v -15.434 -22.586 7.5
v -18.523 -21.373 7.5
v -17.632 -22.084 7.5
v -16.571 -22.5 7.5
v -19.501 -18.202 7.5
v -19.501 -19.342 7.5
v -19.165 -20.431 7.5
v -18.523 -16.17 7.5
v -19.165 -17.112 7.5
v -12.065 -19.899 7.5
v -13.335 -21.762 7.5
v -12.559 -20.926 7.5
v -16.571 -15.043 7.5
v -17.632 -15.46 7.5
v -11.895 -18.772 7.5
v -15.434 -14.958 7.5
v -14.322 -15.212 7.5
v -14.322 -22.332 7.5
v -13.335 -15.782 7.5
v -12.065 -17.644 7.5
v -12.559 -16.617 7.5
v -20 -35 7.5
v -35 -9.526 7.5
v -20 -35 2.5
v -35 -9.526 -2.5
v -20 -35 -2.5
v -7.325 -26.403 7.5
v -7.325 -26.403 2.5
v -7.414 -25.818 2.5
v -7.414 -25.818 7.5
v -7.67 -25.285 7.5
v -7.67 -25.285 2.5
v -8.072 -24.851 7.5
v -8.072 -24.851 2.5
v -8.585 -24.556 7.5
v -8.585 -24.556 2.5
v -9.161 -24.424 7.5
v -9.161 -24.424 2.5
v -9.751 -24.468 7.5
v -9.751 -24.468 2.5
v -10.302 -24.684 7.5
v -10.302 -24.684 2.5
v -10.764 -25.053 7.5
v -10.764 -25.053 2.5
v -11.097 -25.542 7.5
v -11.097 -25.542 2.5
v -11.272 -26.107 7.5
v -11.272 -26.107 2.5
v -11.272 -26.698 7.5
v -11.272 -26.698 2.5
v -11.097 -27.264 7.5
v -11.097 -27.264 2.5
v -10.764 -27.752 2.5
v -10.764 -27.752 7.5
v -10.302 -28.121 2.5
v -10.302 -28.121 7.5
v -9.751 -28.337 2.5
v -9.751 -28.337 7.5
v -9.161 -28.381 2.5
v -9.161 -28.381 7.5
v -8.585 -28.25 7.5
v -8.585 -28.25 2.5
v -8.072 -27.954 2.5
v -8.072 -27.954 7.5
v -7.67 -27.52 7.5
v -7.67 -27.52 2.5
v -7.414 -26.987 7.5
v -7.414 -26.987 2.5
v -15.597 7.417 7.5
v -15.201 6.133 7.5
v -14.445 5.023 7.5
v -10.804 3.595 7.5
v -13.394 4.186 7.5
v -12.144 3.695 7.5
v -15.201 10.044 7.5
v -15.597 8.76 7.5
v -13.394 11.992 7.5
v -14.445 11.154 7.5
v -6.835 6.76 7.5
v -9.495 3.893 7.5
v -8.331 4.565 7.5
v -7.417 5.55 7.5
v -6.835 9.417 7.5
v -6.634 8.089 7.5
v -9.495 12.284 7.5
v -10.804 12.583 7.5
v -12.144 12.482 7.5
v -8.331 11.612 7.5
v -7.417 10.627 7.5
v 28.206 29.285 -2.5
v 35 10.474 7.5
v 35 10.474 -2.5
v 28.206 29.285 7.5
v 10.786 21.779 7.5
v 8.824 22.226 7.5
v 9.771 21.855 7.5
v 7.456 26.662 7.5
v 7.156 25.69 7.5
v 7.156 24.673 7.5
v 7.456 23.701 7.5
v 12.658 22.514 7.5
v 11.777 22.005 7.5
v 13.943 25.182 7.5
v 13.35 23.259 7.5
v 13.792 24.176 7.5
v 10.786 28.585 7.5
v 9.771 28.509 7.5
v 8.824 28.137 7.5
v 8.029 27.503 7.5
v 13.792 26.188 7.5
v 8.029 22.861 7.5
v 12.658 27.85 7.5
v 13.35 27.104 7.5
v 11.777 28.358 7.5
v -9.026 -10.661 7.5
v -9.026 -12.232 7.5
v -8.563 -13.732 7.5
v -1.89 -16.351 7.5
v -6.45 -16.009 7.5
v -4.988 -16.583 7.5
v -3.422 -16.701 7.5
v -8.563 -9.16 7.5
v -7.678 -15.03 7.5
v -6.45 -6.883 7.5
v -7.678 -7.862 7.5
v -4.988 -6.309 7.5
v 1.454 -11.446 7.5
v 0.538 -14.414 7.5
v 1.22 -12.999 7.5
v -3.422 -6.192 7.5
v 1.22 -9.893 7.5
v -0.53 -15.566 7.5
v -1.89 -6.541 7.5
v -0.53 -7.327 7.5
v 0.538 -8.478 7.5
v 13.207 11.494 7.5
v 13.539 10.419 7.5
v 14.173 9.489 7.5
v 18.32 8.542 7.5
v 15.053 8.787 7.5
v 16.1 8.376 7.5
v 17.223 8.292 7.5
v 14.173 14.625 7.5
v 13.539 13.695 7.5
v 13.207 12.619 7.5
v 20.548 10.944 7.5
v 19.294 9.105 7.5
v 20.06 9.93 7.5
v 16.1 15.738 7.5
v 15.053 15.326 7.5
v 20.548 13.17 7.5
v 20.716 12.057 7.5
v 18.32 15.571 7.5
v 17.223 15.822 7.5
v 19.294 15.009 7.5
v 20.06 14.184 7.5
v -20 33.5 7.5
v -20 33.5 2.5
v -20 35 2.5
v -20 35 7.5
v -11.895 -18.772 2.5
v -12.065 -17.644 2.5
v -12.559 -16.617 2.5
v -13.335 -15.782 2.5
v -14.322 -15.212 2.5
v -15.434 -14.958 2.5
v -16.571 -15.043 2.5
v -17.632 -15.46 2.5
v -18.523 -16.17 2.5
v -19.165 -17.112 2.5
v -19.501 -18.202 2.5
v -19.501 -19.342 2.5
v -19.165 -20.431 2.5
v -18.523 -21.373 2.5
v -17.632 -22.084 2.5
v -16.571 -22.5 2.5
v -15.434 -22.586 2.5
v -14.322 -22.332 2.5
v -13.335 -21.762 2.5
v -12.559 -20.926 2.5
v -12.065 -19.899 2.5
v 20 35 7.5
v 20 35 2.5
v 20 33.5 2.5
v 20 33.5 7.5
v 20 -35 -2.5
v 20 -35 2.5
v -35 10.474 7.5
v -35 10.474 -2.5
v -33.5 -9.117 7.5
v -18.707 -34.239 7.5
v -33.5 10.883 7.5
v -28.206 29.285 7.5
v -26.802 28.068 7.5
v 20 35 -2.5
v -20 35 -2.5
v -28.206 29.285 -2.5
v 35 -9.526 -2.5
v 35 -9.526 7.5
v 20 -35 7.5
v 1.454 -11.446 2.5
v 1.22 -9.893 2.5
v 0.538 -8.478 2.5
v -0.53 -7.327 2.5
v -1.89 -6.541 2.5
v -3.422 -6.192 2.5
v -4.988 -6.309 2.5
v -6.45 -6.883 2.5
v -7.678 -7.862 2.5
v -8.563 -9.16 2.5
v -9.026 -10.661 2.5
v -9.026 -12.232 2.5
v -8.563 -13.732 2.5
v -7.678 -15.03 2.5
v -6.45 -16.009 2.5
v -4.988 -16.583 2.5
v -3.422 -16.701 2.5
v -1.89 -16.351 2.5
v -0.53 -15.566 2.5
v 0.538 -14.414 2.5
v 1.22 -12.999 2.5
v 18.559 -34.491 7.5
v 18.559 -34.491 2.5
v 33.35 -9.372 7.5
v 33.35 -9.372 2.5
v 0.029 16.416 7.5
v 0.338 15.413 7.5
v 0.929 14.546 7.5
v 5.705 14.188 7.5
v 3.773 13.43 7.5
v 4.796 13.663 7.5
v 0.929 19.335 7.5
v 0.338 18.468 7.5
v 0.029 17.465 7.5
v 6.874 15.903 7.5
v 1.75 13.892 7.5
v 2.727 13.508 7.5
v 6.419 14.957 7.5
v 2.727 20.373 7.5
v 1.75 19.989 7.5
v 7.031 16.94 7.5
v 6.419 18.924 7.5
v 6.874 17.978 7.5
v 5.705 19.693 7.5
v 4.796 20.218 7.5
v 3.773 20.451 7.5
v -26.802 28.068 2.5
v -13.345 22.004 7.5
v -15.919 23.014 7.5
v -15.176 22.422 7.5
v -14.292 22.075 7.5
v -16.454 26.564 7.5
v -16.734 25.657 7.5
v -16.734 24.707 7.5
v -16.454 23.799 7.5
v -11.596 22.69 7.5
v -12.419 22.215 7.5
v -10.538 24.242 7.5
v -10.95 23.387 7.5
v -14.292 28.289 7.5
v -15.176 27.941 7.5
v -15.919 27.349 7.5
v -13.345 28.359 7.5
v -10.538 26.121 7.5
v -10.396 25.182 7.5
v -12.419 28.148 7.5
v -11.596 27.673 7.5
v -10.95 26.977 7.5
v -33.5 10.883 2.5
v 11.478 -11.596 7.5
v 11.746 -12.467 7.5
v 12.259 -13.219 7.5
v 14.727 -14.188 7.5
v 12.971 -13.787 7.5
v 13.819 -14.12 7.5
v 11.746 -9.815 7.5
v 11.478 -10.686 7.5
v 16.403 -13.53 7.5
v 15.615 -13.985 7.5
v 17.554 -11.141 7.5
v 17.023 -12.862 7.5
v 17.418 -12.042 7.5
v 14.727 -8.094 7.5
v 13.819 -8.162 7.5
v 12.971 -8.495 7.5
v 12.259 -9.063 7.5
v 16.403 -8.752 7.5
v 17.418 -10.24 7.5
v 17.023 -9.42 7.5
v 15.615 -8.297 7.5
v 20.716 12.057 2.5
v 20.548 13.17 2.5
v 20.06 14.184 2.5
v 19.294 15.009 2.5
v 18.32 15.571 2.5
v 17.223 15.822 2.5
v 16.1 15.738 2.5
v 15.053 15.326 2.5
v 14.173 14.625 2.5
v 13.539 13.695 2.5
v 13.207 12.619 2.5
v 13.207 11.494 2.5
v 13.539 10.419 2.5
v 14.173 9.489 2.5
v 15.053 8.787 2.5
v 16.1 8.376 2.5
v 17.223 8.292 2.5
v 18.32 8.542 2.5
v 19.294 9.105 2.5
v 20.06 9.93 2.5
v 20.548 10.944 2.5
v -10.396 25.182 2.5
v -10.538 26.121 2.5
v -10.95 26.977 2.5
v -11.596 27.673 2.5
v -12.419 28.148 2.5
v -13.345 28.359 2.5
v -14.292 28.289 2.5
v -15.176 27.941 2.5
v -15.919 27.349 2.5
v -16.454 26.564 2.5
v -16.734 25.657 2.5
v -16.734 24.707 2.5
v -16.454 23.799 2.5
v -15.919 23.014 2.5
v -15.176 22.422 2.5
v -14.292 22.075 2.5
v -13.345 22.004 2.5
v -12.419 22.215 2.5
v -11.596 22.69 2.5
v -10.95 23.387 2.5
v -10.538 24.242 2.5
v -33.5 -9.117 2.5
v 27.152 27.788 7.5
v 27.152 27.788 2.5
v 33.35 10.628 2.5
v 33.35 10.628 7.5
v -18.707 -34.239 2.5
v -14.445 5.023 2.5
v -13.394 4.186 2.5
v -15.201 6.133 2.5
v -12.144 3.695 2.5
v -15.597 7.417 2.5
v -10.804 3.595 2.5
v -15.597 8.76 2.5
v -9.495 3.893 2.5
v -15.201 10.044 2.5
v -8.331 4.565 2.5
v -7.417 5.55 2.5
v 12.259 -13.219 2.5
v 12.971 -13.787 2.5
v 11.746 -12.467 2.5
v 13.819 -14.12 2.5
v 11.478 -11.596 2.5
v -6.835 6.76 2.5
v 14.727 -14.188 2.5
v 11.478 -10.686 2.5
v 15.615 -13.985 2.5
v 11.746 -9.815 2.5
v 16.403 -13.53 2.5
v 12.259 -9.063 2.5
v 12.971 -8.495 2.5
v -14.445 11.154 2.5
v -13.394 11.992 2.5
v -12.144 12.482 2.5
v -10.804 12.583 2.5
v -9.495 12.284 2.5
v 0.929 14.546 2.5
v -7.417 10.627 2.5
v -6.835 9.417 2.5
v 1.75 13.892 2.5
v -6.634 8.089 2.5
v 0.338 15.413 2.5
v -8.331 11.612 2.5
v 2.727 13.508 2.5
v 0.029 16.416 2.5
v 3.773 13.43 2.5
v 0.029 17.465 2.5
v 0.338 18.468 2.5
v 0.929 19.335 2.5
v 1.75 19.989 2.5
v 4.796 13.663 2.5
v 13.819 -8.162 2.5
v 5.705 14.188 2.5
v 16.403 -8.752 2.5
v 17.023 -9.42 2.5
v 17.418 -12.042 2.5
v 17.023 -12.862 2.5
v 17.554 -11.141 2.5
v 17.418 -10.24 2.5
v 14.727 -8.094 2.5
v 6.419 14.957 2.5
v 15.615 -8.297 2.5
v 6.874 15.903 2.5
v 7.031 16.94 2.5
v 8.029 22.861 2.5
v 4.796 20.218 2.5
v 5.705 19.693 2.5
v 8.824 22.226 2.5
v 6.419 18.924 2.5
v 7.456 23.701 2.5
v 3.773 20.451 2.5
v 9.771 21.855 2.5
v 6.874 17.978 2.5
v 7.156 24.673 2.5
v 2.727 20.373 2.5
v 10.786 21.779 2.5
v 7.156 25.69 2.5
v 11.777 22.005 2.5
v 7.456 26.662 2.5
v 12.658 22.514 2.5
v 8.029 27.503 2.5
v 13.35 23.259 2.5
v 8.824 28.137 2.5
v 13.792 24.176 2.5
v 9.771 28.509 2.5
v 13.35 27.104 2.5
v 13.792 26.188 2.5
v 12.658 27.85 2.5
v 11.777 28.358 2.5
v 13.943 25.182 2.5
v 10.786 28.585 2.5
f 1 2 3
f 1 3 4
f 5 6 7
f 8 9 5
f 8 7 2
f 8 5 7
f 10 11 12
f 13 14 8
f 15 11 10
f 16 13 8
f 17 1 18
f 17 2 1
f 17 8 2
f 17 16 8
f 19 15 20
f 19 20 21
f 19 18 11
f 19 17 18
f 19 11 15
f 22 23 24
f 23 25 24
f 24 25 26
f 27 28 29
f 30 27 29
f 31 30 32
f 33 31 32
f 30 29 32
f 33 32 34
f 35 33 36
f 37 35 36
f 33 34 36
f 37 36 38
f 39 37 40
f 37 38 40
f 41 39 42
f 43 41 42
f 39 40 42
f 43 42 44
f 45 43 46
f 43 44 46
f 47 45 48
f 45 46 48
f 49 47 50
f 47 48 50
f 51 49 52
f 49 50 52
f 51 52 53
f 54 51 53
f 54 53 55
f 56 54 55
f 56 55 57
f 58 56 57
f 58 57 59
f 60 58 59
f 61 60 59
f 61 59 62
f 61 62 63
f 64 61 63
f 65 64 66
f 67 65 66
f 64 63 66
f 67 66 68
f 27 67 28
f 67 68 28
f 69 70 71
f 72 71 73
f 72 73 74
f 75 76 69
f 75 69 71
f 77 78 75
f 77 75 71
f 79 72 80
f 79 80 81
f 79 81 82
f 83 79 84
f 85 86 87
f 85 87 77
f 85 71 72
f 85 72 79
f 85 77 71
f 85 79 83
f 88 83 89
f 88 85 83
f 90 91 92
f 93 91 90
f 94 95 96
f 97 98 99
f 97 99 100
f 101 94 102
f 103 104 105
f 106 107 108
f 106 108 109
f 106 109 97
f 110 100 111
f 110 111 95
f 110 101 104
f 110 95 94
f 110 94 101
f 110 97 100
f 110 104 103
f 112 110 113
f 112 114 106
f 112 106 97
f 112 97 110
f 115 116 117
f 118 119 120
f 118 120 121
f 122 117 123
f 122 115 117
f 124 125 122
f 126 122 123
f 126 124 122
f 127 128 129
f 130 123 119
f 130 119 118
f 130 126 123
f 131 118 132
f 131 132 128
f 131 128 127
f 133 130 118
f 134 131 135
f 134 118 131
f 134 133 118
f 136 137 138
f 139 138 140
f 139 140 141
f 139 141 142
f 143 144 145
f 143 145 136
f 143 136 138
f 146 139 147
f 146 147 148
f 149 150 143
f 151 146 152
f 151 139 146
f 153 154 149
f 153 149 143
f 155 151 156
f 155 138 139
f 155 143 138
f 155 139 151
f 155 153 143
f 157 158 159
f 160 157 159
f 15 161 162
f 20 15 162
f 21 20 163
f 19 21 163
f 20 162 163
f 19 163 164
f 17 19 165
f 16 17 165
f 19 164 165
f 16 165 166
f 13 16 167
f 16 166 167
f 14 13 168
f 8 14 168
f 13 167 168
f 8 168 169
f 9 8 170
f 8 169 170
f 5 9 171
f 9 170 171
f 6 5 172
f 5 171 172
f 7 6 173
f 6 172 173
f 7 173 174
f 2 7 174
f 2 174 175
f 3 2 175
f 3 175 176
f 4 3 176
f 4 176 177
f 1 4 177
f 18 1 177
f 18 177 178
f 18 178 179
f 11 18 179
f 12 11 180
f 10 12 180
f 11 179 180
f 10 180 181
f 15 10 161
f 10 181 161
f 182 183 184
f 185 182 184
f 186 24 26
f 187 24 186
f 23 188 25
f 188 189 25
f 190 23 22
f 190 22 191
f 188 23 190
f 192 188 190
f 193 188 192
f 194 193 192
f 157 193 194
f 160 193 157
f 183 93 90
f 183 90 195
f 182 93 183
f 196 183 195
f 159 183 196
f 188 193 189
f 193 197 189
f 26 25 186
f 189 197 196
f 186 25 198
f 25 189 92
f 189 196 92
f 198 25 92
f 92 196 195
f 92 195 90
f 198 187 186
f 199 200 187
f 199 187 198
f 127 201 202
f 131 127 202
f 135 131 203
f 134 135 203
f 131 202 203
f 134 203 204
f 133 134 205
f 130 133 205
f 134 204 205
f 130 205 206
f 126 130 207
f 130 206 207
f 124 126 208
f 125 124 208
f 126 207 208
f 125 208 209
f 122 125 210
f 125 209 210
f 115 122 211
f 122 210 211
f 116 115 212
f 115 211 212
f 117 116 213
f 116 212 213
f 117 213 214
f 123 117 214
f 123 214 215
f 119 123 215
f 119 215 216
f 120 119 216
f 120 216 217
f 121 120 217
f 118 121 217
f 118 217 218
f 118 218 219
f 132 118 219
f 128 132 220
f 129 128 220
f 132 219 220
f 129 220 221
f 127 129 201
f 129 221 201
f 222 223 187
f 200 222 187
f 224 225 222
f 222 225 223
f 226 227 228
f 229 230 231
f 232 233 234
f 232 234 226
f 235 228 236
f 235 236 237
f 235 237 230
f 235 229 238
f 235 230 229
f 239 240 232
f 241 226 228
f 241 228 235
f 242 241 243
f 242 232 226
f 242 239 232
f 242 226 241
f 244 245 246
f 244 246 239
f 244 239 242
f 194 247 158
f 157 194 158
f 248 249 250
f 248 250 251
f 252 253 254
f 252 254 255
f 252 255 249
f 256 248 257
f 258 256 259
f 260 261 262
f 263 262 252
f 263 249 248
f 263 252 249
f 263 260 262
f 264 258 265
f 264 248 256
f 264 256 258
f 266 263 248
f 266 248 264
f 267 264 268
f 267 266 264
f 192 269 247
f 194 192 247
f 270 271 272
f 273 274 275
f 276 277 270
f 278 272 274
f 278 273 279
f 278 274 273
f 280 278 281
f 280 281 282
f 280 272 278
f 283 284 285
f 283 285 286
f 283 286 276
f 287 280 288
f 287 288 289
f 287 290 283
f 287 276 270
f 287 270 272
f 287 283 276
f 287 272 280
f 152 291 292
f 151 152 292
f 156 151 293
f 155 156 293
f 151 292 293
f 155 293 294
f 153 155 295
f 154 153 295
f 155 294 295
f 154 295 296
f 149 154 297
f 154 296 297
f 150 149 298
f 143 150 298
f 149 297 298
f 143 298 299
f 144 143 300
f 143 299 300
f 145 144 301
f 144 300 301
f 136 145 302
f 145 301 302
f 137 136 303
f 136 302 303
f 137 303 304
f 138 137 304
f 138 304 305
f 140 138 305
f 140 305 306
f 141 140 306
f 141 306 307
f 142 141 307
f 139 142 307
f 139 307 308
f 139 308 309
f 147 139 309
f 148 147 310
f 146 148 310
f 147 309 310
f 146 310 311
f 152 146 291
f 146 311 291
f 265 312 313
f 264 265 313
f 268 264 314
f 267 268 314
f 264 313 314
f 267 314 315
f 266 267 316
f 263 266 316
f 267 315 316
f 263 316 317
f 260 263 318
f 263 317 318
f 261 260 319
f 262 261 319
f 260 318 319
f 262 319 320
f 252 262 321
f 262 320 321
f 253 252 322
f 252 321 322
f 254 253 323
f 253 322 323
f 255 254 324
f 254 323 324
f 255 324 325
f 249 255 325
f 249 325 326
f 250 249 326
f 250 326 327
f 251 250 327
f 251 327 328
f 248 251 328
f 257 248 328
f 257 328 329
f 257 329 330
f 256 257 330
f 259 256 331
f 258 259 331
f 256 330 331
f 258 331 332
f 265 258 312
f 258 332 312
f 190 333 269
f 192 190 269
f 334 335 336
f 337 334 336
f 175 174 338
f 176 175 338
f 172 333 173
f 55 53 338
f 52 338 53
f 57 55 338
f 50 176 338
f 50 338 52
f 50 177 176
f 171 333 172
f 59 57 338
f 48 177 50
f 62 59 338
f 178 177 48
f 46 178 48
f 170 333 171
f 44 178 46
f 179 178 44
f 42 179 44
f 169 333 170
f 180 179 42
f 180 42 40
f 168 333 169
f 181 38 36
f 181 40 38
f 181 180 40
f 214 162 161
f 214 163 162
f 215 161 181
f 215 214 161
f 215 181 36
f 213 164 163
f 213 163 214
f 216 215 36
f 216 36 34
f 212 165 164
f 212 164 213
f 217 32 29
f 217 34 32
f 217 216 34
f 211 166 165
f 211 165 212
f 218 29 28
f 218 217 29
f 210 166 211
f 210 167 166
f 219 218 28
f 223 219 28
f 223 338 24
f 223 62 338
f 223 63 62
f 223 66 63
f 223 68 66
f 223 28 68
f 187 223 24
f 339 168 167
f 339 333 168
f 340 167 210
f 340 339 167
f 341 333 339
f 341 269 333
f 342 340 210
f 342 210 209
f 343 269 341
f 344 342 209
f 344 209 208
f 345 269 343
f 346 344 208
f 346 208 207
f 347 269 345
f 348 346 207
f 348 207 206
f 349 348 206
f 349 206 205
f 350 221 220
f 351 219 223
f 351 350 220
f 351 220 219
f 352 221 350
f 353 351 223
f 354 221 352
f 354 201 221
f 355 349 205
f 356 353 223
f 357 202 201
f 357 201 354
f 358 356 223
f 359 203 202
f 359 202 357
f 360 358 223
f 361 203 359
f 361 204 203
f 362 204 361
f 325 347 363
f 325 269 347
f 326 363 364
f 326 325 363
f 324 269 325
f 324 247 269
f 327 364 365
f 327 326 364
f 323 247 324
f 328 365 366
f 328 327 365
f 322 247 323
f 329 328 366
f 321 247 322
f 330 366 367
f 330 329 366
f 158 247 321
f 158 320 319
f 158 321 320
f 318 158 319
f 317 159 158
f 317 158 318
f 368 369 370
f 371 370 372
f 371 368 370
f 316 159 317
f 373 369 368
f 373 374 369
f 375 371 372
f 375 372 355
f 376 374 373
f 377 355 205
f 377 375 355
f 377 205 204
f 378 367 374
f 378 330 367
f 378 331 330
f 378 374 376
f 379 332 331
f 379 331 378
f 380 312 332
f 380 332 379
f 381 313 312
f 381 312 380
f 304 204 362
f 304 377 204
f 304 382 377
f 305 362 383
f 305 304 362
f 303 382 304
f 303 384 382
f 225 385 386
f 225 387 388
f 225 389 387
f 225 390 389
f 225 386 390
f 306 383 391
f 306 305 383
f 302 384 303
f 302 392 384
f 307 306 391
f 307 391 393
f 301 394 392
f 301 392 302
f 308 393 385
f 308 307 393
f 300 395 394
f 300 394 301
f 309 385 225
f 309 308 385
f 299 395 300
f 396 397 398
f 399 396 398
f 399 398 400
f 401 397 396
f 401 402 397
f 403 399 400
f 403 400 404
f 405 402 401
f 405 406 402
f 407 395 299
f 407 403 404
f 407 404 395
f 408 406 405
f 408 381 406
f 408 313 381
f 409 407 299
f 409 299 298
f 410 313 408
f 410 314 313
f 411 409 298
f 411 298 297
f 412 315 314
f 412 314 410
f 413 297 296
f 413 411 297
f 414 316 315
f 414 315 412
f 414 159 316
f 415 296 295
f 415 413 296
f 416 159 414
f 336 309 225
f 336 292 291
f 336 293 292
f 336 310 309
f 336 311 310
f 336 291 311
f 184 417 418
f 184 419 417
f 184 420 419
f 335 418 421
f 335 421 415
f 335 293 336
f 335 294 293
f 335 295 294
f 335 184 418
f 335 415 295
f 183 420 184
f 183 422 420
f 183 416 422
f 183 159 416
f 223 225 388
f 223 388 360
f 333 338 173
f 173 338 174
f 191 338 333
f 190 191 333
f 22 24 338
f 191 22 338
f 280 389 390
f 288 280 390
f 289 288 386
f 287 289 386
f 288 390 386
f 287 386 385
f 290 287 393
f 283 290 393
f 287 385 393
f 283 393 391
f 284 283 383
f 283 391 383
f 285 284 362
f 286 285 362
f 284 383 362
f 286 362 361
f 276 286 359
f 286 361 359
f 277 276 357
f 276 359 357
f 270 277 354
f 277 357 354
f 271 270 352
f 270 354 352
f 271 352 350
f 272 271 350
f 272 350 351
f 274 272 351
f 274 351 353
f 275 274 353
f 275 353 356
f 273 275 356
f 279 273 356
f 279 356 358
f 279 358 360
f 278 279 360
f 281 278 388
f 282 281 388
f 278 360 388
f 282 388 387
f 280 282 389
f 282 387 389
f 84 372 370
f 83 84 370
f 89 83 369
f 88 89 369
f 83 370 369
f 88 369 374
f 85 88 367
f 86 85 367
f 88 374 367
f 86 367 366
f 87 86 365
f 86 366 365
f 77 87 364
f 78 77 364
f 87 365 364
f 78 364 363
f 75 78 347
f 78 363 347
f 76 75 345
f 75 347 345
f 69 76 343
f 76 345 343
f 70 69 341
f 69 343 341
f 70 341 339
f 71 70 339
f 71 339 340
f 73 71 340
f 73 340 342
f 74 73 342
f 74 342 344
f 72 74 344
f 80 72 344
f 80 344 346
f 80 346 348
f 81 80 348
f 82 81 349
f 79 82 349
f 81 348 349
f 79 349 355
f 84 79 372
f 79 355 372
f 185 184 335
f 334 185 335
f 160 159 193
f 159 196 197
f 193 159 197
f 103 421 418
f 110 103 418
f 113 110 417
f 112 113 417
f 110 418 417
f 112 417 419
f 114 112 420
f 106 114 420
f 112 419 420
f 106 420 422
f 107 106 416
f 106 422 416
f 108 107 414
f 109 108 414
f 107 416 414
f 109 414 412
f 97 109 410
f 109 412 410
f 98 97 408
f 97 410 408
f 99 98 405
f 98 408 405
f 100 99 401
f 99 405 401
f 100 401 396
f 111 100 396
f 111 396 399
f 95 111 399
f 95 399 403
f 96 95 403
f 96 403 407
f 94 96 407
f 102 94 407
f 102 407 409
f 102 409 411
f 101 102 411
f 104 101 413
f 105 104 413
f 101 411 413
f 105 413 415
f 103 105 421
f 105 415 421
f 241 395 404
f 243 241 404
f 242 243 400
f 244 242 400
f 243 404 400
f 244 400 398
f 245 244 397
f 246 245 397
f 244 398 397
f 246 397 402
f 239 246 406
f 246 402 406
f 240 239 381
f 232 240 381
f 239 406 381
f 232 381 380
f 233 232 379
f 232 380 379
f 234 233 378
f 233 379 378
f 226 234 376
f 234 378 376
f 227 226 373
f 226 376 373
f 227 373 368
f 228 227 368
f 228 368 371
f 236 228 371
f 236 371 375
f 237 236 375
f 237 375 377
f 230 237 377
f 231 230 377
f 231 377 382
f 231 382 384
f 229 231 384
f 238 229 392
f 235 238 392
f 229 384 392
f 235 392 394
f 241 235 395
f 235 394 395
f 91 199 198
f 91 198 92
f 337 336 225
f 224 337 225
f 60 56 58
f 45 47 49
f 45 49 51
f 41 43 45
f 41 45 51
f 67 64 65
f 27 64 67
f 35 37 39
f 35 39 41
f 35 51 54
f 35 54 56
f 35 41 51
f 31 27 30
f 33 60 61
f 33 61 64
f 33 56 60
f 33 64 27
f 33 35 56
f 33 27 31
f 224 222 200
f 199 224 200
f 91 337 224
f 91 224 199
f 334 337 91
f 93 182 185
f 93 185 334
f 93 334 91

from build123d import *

# Parameters (mm, degrees)
F1_DEPTH = 2.5
F2_R     = 3.1867202998
F2_R_2   = 3.7755179731
F2_R_3   = 3.0551309049
F2_R_4   = 3.8245534148
F2_R_5   = 1.9841844708
F2_R_6   = 4.5067047705
F2_R_7   = 3.412603706
F2_R_8   = 3.5204745869
F2_R_9   = 5.26912984
F3_DEPTH = 5


with BuildPart() as f1:
    # F0 (on Top) → F1 (new body, symmetric)
    with BuildSketch(Plane.XY):
        Polygon((-28.2061724393, 29.2852179485), (0, 0), (-20, 35), align=None)
        Polygon((-20, 35), (0, 0), (20, 35), align=None)
        Polygon((20, 35), (0, 0), (28.2061724393, 29.2852179485), align=None)
        Polygon((28.2061724393, 29.2852179485), (0, 0), (35, 10.4744788063), align=None)
        Polygon((0, 0), (35, -9.5255211937), (35, 10.4744788063), align=None)
        Polygon((0, 0), (20, -35), (35, -9.5255211937), align=None)
        Polygon((-20, -35), (20, -35), (0, 0), align=None)
        Polygon((-35, -9.5255211937), (-20, -35), (0, 0), align=None)
        Polygon((-35, -9.5255211937), (0, 0), (-35, 10.4744788063), align=None)
        Polygon((-35, 10.4744788063), (0, 0), (-28.2061724393, 29.2852179485), align=None)
    extrude(amount=F1_DEPTH, both=True)

    # F2 (on face) → F3 (join)
    with BuildSketch(Plane.XY.offset(2.5)):
        with Locations((-13.5828489438, 25.1816865057)):
            Circle(F2_R)
        with Locations((16.9404093176, 12.0566859841)):
            Circle(F2_R_2)
        with Locations((14.4985457882, -11.1409882084)):
            Circle(F2_R_3)
        with Locations((-15.7194770873, -18.7718030065)):
            Circle(F2_R_4)
        with Locations((-9.3095935881, -26.402618736)):
            Circle(F2_R_5)
        with Locations((-11.1409891397, 8.0886632204)):
            Circle(F2_R_6)
        with Locations((10.5305230245, 25.1816865057)):
            Circle(F2_R_7)
        with Locations((3.5101757385, 16.940407455)):
            Circle(F2_R_8)
        with Locations((-3.8154073991, -11.4462208003)):
            Circle(F2_R_9)
        Polygon((-20, 35), (-28.2061724393, 29.2852179485), (-26.8015696019, 28.067638371), (-20, 33.5), align=None)
        Polygon((27.1522455229, 27.7875561946), (28.2061724393, 29.2852179485), (20, 35), (20, 33.5), align=None)
        Polygon((33.3497032022, 10.6280450489), (35, 10.4744788063), (28.2061724393, 29.2852179485), (27.1522455229, 27.7875561946), align=None)
        Polygon((33.3497032022, -9.3719549511), (35, -9.5255211937), (35, 10.4744788063), (33.3497032022, 10.6280450489), align=None)
        Polygon((18.5590703823, -34.4908657712), (20, -35), (35, -9.5255211937), (33.3497032022, -9.3719549511), align=None)
        Polygon((-35, -9.5255211937), (-20, -35), (-18.7074316902, -34.2389039715), (-33.5, -9.1167061117), align=None)
        Polygon((-35, 10.4744788063), (-35, -9.5255211937), (-33.5, -9.1167061117), (-33.5, 10.8832938883), align=None)
        Polygon((-28.2061724393, 29.2852179485), (-35, 10.4744788063), (-33.5, 10.8832938883), (-26.8015696019, 28.067638371), align=None)
    extrude(amount=F3_DEPTH)


solid = f1.part
